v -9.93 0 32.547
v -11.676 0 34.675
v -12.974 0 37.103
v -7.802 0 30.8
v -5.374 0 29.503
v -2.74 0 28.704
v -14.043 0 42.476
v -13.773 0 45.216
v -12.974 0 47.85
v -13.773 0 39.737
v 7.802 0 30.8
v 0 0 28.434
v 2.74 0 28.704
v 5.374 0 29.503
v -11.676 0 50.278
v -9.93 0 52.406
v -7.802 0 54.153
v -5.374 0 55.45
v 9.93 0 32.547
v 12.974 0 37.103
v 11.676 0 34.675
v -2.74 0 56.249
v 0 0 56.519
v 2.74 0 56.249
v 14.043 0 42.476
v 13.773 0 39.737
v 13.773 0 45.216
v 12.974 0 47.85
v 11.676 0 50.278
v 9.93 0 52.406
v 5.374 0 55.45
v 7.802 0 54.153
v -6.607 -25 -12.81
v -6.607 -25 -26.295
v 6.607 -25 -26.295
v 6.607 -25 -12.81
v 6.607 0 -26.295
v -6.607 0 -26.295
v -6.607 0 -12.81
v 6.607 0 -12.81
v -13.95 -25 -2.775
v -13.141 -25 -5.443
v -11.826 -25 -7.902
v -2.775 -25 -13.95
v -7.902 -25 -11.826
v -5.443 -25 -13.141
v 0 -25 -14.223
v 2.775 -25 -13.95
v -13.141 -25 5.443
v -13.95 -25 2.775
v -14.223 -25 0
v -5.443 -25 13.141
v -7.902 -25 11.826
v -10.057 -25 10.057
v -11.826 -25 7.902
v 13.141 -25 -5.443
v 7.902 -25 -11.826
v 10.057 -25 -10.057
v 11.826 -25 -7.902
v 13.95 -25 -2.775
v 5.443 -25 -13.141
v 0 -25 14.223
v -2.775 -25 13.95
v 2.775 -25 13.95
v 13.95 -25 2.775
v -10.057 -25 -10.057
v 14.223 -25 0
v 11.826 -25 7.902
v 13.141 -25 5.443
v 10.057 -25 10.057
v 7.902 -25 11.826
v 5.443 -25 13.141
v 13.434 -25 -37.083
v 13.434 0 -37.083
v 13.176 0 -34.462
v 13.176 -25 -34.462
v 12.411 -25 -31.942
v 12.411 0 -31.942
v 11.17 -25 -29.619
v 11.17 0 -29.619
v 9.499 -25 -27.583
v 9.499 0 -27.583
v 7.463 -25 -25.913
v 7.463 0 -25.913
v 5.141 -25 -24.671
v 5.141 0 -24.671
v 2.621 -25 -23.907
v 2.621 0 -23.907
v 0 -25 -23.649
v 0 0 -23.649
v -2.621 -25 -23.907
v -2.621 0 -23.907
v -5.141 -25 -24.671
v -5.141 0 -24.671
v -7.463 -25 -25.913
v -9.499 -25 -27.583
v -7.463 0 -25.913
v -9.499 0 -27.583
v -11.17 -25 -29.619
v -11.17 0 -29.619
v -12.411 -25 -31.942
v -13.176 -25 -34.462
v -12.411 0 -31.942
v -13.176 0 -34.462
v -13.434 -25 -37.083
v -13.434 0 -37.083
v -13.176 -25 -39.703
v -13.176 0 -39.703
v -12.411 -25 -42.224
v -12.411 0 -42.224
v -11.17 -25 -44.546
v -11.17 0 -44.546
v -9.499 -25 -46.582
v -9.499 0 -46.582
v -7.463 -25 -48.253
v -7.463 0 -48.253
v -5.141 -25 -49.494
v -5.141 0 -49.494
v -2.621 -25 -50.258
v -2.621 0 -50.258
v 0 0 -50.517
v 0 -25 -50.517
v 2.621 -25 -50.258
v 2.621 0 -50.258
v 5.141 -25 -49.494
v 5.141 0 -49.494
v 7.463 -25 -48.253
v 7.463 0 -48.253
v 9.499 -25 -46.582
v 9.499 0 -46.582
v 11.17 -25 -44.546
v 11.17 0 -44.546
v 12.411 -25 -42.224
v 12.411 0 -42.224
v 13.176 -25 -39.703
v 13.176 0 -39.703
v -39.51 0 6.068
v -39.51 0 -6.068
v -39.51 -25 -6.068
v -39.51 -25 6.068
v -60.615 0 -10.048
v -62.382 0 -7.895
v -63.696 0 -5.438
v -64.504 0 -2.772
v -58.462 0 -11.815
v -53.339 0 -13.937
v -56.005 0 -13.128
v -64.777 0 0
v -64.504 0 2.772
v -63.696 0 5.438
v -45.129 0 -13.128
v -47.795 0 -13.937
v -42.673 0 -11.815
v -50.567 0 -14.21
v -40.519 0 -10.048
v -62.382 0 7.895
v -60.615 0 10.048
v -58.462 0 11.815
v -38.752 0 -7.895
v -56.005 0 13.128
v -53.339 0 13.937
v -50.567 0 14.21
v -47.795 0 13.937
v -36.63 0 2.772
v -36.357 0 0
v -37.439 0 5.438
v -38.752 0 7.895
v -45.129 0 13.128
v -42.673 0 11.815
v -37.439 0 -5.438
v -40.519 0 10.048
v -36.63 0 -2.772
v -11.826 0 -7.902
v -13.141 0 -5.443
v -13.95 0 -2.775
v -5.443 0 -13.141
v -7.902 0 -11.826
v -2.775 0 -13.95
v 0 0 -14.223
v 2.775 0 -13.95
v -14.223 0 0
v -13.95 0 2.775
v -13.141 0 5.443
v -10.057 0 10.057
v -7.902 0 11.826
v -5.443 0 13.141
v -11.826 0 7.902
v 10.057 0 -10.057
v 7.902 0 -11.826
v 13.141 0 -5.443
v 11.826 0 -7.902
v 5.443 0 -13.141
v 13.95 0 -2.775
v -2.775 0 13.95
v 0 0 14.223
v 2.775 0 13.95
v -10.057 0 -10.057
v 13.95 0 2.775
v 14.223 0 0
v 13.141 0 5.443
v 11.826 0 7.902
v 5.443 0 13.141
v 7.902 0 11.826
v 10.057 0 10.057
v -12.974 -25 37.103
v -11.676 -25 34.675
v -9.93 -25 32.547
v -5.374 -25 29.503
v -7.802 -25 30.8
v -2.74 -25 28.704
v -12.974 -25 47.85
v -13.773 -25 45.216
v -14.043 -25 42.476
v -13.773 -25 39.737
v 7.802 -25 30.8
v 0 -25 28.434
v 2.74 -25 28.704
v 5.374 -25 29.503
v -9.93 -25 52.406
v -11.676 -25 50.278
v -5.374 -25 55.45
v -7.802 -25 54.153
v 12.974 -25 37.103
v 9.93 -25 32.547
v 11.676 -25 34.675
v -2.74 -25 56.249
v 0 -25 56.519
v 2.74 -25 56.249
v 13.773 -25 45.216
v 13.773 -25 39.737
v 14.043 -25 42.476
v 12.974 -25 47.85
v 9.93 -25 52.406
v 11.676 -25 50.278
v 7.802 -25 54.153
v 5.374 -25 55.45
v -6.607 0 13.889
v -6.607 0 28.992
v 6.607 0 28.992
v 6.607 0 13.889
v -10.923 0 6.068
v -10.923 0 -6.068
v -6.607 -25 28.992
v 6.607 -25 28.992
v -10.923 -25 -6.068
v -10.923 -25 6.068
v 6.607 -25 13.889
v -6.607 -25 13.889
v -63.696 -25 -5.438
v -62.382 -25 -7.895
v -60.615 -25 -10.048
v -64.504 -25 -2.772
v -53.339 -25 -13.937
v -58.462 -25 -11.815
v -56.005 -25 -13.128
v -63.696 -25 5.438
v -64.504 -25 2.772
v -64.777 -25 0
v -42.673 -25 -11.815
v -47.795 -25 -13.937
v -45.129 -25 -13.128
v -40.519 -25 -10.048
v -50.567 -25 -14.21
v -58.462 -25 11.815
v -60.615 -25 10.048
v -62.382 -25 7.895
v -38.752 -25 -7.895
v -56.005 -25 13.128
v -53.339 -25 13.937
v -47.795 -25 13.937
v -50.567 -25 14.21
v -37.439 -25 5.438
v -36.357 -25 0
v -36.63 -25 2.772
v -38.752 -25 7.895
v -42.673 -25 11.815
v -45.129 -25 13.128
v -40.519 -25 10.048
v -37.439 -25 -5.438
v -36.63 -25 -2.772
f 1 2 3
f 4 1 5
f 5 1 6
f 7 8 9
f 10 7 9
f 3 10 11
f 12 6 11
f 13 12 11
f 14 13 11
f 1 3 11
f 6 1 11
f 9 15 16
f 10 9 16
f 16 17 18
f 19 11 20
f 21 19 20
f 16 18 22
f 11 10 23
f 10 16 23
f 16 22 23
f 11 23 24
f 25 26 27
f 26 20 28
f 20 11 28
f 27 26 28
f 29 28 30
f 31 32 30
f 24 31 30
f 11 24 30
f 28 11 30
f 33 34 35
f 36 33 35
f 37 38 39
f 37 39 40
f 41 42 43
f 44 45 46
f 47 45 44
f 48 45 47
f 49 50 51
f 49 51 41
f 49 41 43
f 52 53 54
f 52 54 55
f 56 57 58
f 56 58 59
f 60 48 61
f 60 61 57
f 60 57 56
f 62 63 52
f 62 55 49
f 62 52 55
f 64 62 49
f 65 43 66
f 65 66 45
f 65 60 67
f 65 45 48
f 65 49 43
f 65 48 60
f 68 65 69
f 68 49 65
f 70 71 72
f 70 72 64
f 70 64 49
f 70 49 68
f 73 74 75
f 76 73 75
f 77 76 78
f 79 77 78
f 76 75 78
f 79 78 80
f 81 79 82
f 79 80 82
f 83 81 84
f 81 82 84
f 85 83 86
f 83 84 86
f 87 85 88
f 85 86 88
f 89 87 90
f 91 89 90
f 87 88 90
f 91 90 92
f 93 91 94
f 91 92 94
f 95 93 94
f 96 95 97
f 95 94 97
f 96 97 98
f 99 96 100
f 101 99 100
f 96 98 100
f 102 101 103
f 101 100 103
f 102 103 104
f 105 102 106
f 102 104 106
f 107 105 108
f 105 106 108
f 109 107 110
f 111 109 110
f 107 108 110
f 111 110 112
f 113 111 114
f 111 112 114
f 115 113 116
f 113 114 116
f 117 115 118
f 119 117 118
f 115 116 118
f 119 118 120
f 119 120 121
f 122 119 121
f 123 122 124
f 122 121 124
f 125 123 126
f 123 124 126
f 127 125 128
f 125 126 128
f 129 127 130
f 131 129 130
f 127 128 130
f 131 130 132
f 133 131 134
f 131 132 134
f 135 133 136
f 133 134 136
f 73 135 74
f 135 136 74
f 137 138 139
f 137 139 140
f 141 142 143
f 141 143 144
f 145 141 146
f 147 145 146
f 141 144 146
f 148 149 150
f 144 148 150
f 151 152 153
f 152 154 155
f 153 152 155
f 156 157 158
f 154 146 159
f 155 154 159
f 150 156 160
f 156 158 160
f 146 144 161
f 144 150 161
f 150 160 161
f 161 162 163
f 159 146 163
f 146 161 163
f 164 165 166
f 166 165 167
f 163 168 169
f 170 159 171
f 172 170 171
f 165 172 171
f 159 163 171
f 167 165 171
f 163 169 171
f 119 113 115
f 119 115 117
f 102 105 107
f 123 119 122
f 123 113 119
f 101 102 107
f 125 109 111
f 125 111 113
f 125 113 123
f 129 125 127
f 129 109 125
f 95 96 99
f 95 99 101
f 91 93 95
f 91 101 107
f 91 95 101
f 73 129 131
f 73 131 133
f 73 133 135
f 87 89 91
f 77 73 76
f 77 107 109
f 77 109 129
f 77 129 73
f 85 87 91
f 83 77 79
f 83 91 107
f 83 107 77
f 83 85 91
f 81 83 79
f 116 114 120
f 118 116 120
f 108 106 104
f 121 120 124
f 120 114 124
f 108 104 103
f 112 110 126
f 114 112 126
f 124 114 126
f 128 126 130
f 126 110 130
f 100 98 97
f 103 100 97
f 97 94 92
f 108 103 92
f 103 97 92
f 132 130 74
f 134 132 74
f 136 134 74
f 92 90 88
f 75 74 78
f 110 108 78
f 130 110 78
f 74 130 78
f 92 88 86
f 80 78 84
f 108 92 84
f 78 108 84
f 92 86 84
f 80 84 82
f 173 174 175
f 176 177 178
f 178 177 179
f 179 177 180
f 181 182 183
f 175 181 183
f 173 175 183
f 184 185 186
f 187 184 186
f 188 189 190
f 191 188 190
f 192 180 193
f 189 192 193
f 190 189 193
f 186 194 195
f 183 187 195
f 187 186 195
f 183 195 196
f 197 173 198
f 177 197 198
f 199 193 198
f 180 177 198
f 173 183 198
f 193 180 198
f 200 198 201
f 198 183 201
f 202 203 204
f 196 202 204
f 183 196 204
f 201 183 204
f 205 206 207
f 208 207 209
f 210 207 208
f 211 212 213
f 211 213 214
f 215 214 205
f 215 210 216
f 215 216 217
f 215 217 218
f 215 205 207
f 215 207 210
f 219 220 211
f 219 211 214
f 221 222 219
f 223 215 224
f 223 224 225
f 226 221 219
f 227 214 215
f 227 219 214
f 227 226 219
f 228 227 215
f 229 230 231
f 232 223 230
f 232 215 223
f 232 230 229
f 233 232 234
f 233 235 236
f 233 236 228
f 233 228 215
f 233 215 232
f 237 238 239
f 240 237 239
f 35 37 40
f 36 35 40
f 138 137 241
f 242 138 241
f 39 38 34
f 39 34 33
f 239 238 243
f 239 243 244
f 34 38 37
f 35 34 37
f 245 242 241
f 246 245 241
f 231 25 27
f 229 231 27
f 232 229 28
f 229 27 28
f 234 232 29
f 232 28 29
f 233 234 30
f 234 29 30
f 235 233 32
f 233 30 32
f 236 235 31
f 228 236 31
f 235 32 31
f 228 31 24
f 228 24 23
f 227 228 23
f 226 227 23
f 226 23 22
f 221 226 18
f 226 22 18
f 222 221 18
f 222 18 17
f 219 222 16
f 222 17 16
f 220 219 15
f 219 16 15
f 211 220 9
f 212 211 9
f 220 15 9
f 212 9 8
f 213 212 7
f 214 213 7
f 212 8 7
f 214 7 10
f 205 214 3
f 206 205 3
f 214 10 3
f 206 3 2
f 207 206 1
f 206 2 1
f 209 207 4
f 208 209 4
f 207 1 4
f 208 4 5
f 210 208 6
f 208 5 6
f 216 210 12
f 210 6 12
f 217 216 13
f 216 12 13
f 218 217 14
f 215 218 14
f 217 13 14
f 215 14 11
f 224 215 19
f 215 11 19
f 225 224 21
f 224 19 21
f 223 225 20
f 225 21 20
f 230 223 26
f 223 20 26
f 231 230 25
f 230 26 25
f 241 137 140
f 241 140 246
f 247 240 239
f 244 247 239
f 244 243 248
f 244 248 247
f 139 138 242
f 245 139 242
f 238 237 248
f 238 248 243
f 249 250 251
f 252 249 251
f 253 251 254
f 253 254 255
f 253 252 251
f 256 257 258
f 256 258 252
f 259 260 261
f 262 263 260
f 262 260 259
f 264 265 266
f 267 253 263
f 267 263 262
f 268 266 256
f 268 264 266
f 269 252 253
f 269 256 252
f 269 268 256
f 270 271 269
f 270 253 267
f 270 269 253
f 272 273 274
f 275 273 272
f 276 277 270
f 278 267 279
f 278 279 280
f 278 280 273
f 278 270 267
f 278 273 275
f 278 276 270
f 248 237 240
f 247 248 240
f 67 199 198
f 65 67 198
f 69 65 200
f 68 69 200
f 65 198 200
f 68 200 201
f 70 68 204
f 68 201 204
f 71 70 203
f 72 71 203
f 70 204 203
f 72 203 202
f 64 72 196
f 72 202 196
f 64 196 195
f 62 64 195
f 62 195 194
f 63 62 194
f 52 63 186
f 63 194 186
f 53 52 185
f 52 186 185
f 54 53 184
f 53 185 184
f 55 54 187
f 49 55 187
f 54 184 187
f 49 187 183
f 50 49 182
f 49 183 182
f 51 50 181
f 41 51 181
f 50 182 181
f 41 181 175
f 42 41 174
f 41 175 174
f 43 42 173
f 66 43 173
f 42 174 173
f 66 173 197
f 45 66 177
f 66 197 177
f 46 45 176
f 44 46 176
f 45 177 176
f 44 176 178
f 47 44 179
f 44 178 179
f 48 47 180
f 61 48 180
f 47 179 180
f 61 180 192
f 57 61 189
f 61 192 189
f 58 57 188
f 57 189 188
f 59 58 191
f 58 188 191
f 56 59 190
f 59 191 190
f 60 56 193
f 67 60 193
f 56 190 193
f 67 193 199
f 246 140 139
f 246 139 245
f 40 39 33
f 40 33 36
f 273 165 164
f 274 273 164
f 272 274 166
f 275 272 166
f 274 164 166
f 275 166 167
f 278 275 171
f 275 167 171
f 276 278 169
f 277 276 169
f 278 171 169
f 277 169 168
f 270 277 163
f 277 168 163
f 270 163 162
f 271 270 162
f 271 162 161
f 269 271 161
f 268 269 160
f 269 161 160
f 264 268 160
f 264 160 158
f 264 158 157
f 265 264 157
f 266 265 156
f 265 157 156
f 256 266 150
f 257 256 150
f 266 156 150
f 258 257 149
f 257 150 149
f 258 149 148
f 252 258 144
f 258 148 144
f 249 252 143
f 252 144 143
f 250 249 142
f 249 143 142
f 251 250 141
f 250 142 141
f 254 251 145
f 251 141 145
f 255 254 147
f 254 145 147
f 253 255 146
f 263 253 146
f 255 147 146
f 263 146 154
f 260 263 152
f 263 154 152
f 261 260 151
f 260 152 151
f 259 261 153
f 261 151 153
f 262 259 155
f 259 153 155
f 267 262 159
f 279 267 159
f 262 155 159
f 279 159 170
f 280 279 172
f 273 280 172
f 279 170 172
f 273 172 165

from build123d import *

# Parameters (mm, degrees)
F0_R     = 14.223306
F1_DEPTH = 25
F2_R     = 14.042759
F3_DEPTH = 25
F4_R     = 13.433927
F5_DEPTH = 25
F6_R     = 14.210097
F7_DEPTH = 25
F8_W     = 13.214898
F8_H     = 15.102737
F8_H_2   = 13.484589
F8_W_2   = 28.587332
F8_H_3   = 12.13613
F9_DEPTH = 25


with BuildPart() as f1:
    # F0 (on Front) → F1 (new body)
    with BuildSketch(Plane.XZ):
        Circle(F0_R)
    extrude(amount=F1_DEPTH)


with BuildPart() as f3:
    # F2 (on Front) → F3 (new body)
    with BuildSketch(Plane.XZ):
        with Locations((0, 42.47646)):
            Circle(F2_R)
    extrude(amount=F3_DEPTH)


with BuildPart() as f5:
    # F4 (on Front) → F5 (new body)
    with BuildSketch(Plane.XZ):
        with Locations((0, -37.08262)):
            Circle(F4_R)
    extrude(amount=F5_DEPTH)


with BuildPart() as f7:
    # F6 (on Front) → F7 (new body)
    with BuildSketch(Plane.XZ):
        with Locations((-50.56721, 0)):
            Circle(F6_R)
    extrude(amount=F7_DEPTH)


with BuildPart() as f9:
    # F8 (on Front) → F9 (new body)
    with BuildSketch(Plane.XZ):
        with Locations((0, 21.440499)):
            Rectangle(F8_W, F8_H)
        with Locations((0, -19.552656)):
            Rectangle(F8_W, F8_H_2)
        with Locations((-25.216183, 0)):
            Rectangle(F8_W_2, F8_H_3)
    extrude(amount=F9_DEPTH)


solid = Compound([f1.part, f3.part, f5.part, f7.part, f9.part])
